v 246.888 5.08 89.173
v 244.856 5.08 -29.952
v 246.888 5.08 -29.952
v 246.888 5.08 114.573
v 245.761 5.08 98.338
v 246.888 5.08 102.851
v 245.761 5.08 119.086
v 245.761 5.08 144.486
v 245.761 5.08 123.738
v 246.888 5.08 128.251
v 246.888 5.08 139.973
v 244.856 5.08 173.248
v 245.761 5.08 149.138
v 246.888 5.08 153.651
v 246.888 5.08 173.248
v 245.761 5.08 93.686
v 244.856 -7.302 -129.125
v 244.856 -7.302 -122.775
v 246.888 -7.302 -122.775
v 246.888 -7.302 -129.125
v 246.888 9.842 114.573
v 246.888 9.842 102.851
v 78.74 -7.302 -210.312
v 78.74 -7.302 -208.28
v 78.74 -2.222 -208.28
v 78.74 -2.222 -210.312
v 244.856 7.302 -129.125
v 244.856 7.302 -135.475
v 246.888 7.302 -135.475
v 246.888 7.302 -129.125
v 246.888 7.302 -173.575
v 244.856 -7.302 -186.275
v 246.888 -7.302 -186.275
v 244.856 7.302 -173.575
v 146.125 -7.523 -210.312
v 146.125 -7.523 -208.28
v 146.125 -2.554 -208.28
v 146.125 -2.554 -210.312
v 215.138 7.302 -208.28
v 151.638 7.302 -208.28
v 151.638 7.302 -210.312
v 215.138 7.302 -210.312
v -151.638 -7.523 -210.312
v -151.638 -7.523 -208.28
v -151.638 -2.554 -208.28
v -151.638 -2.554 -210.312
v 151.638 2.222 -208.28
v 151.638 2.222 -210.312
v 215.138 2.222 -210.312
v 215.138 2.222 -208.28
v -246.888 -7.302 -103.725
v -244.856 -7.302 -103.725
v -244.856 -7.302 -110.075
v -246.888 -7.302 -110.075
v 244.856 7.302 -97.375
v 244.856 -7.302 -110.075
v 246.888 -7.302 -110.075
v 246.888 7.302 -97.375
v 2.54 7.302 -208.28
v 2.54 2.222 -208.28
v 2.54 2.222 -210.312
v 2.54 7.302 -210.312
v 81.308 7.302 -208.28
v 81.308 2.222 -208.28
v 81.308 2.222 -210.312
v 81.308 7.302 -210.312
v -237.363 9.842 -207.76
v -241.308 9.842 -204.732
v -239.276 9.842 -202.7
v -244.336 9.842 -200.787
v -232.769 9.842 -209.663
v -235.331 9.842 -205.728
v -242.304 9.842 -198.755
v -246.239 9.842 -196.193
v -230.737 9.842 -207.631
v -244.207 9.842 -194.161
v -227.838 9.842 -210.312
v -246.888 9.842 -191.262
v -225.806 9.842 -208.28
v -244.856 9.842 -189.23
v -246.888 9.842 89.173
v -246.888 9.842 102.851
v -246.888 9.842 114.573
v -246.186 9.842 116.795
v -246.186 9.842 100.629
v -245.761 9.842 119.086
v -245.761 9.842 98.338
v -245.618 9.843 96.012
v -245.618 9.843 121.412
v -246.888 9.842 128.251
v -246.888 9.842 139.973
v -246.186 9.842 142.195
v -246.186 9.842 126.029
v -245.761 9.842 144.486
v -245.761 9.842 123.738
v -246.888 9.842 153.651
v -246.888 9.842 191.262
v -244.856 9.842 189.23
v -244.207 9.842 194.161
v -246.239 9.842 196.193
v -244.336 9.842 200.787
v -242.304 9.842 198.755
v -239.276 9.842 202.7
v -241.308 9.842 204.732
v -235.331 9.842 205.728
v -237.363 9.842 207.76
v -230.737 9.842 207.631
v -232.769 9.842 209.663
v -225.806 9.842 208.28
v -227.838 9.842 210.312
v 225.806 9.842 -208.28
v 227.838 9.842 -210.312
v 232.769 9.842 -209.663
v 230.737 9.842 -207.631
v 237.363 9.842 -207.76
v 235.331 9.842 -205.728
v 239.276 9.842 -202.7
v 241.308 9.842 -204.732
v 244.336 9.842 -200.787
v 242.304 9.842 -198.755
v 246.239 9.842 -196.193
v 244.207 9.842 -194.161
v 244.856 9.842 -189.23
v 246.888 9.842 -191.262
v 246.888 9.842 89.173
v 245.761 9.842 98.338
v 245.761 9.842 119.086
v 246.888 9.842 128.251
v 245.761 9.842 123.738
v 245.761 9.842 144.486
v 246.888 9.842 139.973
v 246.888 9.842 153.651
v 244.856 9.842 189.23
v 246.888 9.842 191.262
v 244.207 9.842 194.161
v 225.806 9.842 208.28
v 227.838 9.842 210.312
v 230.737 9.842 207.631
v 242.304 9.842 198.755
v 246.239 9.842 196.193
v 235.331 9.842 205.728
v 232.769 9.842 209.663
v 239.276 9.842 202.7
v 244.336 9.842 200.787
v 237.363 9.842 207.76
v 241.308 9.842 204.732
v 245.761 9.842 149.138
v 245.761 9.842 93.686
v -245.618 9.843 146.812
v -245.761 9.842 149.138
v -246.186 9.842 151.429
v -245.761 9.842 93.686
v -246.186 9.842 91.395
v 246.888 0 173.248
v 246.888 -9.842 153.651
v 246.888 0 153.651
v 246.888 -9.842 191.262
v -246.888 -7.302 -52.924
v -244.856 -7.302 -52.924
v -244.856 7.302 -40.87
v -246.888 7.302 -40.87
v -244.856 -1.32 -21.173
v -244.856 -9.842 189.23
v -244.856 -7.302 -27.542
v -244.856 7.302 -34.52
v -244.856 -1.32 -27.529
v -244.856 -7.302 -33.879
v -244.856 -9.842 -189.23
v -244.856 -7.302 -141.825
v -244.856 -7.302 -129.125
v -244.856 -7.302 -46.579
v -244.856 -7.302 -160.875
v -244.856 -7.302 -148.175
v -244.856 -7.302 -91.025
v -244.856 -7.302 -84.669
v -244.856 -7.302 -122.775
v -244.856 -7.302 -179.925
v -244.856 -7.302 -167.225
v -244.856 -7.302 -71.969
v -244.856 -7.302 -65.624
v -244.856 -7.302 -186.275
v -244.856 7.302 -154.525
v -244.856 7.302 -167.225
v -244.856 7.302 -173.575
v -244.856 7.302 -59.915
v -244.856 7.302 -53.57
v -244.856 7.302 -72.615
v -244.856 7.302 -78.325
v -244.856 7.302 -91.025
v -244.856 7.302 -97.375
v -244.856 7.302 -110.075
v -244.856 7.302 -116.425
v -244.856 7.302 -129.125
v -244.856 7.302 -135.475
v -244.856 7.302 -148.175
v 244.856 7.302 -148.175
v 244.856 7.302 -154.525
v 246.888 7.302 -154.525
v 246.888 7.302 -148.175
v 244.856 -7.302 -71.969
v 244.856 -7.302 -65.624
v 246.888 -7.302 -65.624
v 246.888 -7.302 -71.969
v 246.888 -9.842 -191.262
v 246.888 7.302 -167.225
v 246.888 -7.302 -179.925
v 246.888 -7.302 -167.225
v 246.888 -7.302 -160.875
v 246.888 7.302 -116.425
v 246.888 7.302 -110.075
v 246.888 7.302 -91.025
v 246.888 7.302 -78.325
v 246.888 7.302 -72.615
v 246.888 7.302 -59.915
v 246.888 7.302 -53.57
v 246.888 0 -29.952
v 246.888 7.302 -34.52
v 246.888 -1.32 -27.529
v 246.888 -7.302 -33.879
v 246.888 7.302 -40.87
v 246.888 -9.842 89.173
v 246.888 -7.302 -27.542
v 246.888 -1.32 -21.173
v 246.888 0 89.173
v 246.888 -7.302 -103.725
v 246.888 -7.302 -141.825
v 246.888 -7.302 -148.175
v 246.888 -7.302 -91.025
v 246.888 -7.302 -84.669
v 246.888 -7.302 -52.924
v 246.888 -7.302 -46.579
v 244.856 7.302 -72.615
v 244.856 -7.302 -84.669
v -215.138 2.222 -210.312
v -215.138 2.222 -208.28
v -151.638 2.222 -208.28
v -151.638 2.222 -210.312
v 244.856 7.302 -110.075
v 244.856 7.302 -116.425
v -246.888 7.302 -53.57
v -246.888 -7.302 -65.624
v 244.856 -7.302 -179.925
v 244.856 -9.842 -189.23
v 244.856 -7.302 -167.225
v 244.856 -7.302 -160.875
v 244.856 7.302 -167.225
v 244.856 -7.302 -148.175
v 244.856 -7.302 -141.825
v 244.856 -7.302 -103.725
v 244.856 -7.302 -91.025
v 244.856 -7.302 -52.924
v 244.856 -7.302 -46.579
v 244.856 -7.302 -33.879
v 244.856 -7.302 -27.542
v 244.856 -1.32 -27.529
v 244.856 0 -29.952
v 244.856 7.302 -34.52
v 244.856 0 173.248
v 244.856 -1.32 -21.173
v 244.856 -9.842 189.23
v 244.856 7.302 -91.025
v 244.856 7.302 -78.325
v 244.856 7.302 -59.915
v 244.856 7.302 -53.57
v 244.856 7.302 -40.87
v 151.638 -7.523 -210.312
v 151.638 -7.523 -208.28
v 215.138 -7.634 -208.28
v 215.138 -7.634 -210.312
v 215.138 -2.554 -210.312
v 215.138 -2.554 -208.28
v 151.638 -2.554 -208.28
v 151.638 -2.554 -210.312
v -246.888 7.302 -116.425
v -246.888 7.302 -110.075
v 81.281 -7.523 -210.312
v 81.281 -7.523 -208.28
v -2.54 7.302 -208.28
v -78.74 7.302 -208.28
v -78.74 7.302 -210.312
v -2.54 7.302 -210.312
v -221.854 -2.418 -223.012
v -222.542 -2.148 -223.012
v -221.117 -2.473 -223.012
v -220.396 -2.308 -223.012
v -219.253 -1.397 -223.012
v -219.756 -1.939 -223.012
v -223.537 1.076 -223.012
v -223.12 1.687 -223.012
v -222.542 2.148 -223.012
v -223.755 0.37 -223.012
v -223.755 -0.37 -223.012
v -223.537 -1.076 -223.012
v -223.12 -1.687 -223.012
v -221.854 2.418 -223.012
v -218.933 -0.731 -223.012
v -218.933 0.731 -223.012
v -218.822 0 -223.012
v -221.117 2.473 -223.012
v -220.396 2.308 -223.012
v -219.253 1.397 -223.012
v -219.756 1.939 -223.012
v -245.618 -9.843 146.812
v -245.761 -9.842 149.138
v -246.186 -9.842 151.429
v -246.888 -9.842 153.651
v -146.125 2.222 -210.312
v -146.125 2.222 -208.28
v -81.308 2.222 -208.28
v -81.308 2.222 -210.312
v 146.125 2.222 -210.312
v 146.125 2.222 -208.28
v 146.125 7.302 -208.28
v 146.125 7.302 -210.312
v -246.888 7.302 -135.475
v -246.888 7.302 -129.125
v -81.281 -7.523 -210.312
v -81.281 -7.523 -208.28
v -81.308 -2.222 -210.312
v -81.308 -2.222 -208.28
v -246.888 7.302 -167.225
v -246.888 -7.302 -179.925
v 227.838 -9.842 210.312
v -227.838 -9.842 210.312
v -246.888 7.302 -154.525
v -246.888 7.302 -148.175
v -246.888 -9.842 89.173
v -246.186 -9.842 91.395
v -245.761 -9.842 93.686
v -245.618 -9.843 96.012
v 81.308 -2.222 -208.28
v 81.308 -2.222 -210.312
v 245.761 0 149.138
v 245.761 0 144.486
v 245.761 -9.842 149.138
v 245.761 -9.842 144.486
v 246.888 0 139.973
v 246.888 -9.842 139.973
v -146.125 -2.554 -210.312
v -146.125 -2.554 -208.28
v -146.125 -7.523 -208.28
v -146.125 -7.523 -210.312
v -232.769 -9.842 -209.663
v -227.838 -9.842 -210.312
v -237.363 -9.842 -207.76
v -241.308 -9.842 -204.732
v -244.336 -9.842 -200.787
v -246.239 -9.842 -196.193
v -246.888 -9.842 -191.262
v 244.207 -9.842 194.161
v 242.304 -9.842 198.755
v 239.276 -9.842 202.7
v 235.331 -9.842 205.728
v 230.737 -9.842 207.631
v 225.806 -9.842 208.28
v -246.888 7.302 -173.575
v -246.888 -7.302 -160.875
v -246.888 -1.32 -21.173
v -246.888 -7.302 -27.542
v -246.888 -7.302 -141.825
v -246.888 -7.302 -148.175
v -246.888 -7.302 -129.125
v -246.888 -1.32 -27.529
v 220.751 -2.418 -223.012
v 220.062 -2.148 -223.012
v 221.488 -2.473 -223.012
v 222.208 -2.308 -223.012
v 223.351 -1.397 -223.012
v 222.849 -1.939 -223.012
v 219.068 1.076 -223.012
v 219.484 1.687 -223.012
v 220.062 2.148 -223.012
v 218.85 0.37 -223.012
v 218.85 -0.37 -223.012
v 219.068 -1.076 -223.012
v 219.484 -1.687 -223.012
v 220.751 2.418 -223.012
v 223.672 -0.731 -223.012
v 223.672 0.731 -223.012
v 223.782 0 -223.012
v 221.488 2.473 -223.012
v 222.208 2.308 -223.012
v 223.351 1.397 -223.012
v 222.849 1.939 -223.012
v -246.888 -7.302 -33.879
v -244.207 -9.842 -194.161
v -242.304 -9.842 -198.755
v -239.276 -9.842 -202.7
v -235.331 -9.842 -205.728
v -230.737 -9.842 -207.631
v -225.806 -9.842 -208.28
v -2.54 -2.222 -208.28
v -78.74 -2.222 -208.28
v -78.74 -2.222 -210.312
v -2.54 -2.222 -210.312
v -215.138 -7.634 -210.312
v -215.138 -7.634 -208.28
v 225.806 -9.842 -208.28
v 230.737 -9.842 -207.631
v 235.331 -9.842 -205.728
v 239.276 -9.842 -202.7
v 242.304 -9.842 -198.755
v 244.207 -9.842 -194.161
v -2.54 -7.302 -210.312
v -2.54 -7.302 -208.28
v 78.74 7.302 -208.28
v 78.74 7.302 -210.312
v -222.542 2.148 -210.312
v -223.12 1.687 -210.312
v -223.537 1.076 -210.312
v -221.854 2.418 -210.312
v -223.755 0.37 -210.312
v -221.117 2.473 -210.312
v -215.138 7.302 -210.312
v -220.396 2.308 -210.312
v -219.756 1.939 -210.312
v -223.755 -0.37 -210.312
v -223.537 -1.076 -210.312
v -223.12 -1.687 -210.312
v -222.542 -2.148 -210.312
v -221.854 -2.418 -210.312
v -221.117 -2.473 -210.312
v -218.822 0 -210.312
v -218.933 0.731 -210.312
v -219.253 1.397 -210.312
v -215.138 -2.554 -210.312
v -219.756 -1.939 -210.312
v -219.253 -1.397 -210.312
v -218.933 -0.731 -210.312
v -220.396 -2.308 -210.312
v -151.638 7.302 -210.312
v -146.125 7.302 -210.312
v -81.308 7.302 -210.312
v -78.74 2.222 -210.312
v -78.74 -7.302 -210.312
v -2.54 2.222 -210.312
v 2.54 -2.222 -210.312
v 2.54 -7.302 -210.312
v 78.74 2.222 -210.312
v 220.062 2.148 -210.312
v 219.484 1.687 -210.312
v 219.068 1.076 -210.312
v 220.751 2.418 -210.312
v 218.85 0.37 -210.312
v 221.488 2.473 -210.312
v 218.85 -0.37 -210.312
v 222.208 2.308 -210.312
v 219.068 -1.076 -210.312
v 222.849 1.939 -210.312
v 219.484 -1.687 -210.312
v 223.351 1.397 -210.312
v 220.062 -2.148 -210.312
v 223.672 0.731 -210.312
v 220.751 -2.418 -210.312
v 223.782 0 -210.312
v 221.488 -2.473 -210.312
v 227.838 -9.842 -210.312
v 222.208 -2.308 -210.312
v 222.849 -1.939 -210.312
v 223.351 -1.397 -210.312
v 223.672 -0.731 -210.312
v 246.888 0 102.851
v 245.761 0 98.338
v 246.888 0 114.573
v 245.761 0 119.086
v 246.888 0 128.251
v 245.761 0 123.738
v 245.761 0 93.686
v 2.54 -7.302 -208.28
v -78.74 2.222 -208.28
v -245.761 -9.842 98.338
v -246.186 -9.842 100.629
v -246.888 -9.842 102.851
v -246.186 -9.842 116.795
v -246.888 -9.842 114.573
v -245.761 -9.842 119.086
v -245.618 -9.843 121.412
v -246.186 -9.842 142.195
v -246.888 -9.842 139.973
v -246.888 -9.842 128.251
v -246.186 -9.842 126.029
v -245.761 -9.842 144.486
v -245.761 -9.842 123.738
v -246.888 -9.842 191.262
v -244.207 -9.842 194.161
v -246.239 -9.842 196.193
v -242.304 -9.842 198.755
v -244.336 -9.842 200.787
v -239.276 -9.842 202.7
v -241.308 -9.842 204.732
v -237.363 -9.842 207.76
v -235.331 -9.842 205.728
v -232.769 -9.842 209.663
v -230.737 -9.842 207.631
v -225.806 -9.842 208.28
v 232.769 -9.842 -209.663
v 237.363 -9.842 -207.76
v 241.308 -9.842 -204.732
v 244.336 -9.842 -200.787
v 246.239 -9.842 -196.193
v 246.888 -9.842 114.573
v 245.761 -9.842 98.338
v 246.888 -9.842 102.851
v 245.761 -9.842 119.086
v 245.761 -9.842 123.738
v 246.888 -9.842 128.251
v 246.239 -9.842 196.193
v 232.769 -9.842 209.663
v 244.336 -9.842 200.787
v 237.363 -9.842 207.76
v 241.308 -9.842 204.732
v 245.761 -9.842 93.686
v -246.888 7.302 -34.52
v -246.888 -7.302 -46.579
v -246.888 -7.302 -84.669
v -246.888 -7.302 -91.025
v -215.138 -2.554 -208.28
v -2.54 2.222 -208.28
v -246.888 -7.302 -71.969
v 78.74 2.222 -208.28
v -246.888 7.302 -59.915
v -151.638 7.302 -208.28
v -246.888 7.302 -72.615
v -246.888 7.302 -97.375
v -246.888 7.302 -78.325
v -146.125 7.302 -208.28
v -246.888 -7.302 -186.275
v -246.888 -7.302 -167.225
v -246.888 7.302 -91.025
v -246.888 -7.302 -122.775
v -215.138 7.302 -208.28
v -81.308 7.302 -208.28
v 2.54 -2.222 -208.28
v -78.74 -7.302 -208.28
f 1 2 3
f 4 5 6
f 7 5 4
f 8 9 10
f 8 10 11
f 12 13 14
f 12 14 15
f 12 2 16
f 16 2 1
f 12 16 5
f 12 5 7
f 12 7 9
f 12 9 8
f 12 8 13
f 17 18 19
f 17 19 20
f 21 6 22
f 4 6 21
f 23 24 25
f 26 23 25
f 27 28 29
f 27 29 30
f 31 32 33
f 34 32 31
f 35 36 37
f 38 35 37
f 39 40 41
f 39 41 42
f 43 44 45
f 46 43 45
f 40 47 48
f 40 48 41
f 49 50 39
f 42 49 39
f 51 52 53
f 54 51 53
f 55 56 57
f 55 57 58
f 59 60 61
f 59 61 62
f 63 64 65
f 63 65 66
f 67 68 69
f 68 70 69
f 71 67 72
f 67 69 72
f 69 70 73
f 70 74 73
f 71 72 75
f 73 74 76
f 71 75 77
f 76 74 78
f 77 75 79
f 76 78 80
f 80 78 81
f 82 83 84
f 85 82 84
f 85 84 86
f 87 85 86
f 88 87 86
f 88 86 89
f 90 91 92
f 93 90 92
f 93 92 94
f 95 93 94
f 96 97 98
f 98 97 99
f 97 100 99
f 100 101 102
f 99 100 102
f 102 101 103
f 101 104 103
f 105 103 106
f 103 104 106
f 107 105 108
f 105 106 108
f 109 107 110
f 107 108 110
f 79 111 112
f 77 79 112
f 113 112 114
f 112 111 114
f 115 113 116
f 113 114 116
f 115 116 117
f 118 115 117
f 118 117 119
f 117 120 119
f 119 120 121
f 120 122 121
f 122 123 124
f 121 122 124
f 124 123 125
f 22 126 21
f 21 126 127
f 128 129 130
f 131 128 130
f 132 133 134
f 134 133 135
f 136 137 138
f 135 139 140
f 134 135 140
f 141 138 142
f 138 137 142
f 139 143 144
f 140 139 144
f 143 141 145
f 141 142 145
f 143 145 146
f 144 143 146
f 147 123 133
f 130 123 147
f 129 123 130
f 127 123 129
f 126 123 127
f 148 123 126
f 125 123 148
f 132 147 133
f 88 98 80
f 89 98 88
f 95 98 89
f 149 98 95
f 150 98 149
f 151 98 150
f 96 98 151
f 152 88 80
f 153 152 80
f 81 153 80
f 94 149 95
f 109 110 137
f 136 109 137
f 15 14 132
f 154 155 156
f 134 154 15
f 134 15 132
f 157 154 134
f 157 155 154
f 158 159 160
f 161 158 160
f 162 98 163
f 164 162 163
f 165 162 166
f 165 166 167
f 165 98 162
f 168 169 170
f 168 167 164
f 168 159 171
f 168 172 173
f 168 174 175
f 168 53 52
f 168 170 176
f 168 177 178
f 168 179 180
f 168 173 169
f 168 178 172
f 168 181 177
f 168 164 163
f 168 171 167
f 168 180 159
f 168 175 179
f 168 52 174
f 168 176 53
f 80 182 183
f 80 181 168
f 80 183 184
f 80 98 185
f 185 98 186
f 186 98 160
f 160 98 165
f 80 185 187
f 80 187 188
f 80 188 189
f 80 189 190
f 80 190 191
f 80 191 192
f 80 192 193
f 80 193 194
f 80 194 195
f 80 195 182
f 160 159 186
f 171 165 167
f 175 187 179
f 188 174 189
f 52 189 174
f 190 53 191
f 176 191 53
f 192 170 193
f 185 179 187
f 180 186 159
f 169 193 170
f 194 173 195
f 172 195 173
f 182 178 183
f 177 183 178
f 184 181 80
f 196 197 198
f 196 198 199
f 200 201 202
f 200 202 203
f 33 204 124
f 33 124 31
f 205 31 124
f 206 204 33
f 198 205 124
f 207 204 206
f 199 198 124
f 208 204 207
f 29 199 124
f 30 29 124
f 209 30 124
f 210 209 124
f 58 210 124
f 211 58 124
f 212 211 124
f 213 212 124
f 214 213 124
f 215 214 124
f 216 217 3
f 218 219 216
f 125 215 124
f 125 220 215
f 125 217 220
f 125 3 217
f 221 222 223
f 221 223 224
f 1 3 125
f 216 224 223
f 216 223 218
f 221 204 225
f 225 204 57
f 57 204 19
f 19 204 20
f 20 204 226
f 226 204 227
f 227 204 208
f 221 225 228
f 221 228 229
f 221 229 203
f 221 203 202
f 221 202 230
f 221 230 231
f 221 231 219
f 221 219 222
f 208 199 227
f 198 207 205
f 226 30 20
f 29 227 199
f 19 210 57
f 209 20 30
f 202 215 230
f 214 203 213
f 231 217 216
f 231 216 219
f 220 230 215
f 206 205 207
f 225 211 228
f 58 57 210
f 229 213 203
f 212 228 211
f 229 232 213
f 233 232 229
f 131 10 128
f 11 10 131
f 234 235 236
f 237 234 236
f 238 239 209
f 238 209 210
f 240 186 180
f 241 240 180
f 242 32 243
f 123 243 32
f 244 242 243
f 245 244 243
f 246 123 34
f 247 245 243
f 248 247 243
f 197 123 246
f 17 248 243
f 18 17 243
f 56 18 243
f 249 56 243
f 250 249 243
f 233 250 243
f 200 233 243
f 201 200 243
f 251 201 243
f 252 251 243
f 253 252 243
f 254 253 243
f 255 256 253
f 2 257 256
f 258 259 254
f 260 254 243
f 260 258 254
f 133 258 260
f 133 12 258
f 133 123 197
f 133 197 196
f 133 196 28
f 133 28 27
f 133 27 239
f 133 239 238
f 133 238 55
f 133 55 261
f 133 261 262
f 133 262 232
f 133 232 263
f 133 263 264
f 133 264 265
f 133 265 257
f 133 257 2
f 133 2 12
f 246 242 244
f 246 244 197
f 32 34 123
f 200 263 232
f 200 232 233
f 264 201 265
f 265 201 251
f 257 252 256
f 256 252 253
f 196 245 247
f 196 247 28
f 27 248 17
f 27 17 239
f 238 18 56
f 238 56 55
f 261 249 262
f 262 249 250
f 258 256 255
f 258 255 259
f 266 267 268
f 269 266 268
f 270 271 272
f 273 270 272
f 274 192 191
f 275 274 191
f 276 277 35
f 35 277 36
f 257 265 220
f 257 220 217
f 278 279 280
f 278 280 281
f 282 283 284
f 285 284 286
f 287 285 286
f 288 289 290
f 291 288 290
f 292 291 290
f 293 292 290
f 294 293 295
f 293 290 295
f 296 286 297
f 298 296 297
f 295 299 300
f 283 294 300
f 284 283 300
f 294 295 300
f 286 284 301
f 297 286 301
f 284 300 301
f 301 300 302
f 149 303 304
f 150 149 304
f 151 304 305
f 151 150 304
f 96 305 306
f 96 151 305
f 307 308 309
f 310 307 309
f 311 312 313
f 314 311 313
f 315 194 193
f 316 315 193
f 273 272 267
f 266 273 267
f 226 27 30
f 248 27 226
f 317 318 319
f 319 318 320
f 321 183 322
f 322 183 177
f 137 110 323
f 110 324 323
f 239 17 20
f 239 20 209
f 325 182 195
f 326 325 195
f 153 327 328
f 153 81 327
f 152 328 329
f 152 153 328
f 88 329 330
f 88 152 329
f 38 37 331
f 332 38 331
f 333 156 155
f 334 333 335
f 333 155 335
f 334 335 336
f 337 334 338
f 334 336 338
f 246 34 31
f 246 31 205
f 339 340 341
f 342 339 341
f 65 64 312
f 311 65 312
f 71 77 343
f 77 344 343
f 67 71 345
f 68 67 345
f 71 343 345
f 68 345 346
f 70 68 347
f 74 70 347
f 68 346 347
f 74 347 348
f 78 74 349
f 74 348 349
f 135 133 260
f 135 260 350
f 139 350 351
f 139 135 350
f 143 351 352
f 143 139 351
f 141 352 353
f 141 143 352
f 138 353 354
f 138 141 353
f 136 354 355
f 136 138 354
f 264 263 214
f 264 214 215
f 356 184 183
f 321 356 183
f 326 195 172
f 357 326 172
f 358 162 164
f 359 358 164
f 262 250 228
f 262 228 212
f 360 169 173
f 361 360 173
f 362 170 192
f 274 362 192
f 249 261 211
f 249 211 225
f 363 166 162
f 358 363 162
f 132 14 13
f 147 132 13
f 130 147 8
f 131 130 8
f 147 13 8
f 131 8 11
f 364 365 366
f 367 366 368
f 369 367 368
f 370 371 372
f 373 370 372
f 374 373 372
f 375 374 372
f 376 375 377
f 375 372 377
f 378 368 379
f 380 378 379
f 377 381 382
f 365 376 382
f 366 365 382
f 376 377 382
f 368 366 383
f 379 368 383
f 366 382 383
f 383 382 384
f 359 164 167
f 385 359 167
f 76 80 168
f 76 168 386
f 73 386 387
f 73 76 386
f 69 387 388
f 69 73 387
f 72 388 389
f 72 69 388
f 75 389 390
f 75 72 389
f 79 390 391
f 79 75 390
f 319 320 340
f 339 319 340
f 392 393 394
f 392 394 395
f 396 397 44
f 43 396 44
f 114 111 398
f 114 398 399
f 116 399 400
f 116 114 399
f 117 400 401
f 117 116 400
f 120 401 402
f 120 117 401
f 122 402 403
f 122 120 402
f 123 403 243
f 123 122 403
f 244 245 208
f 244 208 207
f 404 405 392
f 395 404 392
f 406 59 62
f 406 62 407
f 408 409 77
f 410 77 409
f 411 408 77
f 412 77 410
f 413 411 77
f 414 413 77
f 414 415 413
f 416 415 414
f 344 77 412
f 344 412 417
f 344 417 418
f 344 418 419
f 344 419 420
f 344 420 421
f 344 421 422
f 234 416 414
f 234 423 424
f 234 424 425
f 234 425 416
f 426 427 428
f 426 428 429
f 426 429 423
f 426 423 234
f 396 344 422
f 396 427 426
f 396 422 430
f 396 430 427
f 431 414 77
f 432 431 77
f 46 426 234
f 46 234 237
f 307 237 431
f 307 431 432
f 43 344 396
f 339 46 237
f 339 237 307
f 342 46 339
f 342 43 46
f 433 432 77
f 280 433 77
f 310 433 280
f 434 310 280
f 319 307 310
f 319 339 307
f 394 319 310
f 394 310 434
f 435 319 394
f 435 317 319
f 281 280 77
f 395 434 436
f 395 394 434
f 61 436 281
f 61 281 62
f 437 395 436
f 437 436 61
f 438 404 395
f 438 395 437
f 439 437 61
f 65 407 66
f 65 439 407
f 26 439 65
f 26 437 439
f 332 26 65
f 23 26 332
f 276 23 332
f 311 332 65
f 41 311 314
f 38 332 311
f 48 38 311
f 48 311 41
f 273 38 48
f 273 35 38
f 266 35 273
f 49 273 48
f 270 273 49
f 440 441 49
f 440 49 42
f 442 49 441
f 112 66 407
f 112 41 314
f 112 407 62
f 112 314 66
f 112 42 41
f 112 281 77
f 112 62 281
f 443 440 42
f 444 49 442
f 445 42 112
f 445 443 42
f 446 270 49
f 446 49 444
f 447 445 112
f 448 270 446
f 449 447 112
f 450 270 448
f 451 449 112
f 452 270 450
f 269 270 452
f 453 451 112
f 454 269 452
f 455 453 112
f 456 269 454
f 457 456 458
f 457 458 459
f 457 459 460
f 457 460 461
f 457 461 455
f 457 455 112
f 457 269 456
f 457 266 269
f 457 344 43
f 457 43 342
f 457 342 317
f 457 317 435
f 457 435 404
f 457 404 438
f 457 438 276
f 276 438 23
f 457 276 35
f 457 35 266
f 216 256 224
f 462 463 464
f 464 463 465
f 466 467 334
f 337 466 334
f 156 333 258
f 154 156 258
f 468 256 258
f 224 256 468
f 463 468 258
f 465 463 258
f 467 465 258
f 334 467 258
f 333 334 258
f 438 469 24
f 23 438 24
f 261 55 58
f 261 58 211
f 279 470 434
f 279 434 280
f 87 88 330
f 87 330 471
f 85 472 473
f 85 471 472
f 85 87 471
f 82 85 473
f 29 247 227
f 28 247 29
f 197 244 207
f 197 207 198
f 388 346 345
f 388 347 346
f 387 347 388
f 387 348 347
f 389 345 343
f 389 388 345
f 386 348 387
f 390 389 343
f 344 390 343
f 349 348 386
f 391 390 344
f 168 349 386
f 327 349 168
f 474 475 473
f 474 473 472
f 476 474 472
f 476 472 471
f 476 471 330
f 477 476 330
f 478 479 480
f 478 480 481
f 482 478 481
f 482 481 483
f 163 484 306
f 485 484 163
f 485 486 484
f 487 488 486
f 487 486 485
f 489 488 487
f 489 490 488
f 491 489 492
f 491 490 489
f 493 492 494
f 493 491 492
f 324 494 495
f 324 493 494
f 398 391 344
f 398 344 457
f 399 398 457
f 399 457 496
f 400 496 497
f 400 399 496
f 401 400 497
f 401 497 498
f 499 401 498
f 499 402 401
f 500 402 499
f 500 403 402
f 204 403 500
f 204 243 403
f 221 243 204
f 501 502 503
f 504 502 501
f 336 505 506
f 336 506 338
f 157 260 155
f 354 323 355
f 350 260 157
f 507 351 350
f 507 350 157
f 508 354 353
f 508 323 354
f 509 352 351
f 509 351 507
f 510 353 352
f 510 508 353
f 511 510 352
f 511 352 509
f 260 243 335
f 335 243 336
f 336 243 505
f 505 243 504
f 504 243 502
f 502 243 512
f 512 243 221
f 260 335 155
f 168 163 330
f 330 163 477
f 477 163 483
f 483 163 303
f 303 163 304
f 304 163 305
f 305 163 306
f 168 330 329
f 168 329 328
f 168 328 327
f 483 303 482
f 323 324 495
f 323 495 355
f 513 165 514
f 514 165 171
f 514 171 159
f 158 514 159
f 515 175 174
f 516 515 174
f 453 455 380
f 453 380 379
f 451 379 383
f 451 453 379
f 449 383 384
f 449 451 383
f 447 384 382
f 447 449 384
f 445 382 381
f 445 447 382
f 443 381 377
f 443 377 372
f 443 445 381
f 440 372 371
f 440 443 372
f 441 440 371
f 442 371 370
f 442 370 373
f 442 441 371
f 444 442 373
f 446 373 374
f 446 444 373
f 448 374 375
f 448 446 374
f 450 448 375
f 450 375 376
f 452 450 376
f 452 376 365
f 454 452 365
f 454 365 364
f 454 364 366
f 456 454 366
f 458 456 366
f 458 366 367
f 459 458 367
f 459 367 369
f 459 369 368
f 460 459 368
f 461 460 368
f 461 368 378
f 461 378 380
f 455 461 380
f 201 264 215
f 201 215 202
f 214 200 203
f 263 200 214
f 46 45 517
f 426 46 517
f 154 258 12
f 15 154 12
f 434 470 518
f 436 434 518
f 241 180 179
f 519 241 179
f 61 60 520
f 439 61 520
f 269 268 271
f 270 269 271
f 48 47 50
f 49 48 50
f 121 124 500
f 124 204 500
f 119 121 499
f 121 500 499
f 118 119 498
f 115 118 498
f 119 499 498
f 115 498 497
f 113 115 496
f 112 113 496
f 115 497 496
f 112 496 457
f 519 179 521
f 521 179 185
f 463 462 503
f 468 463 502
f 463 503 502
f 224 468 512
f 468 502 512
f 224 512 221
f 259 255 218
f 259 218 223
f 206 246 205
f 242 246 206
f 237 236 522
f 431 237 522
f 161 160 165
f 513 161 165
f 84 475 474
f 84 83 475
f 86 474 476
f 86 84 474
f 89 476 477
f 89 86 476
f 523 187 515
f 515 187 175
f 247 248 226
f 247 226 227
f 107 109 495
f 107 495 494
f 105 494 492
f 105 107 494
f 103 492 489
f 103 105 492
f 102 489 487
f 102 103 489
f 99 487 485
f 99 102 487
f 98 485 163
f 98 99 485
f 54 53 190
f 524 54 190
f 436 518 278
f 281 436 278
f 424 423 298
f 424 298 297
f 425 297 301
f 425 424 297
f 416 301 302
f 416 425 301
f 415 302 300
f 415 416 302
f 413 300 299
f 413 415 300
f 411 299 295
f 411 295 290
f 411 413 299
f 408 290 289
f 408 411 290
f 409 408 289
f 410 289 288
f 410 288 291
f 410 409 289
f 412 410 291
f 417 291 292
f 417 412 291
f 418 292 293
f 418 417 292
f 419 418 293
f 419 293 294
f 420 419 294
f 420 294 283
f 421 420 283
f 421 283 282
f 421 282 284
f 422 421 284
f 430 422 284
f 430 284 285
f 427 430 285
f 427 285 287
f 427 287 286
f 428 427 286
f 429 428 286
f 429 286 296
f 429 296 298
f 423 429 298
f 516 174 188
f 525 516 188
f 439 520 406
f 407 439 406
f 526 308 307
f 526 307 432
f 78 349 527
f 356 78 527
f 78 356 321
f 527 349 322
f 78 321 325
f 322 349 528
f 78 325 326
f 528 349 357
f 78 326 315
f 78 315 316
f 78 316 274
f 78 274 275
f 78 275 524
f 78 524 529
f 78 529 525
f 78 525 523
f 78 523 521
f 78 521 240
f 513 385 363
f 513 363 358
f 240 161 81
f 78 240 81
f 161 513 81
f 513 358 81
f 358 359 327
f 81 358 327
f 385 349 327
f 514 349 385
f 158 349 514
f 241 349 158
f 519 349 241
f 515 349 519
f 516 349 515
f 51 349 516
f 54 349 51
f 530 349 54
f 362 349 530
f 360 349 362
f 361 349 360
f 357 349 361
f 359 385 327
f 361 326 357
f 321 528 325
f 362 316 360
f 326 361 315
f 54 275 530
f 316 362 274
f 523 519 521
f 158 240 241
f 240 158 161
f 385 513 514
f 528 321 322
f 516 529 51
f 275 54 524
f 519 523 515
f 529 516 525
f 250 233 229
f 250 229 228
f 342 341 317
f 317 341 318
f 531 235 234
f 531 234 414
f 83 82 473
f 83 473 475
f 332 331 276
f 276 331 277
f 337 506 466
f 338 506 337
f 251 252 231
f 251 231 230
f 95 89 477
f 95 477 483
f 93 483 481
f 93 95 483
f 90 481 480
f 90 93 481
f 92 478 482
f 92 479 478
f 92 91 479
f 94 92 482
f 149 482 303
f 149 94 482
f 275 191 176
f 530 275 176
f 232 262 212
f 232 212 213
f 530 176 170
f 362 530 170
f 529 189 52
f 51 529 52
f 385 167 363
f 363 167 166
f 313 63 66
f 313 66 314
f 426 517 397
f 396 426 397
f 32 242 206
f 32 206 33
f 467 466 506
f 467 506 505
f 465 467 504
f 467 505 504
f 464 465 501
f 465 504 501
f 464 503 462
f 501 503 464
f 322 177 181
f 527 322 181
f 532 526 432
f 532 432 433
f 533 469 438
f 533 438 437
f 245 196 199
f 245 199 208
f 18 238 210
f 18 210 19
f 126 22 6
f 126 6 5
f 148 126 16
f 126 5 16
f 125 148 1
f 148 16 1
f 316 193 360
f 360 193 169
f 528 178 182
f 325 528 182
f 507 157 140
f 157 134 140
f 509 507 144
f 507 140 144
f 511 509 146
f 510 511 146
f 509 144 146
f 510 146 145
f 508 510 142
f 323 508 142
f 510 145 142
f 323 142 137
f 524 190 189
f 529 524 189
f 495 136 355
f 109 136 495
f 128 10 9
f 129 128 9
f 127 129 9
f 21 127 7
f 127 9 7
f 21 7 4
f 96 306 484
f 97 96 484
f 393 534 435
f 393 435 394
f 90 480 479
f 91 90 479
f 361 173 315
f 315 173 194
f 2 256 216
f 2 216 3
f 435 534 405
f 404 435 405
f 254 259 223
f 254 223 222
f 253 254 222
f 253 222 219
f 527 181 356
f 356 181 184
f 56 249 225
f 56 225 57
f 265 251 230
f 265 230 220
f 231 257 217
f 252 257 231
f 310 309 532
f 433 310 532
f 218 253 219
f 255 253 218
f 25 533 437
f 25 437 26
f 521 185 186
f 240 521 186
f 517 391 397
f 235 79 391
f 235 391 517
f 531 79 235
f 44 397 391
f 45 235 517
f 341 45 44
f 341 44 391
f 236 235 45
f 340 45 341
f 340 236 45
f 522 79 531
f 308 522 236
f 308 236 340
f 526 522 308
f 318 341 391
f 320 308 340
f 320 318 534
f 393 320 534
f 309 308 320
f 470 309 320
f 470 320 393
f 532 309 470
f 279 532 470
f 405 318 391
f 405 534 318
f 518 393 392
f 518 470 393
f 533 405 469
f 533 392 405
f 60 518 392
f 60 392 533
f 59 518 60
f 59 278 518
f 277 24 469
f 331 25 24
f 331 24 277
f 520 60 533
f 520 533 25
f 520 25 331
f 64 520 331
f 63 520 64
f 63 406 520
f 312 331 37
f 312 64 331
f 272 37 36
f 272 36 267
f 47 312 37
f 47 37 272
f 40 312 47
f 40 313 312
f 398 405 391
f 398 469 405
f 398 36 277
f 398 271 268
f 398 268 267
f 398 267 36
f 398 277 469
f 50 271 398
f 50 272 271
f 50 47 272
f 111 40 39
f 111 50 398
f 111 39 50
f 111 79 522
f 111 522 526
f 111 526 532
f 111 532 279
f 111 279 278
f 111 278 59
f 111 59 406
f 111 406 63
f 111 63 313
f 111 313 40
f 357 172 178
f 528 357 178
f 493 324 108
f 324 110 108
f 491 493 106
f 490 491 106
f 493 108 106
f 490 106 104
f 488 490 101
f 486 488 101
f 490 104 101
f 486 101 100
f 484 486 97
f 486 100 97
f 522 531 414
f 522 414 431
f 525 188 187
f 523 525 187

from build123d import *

# Parameters (mm, degrees)
F0_W      = 493.776
F0_H      = 420.624
F1_DEPTH  = 9.8425
F2_R      = 19.05
F3_R      = 19.05
F4_R      = 19.05
F5_R      = 19.05
F7_DEPTH  = 9.8435
F8_DEPTH  = 50.8
F9_DEPTH  = 9.8435
F11_DEPTH = 381
F12_DEPTH = 381
F13_W     = 76.2
F13_H     = 5.08
F13_W_2   = 63.499903
F13_W_3   = 64.816944
F14_DEPTH = 254
F16_DEPTH = 63.5
F17_R     = 2.479907
F18_DEPTH = 223.012
F19_DEPTH = 208.28
F20_W     = 5.08
F20_H     = 203.2
F21_DEPTH = 254


with BuildPart() as f1:
    # F0 (on Front) → F1 (new body, symmetric)
    with BuildSketch(Plane.XZ):
        Rectangle(F0_W, F0_H)
    extrude(amount=F1_DEPTH, both=True)

    # F2
    f2_edges = [f1.edges().sort_by_distance(p)[0] for p in [
        (246.888, 0, 210.312),
    ]]
    fillet(f2_edges, radius=F2_R)

    # F3
    f3_edges = [f1.edges().sort_by_distance(p)[0] for p in [
        (-246.888, 0, 210.312),
    ]]
    fillet(f3_edges, radius=F3_R)

    # F4
    f4_edges = [f1.edges().sort_by_distance(p)[0] for p in [
        (246.888, 0, -210.312),
    ]]
    fillet(f4_edges, radius=F4_R)

    # F5
    f5_edges = [f1.edges().sort_by_distance(p)[0] for p in [
        (-246.888, 0, -210.312),
    ]]
    fillet(f5_edges, radius=F5_R)

    # F6 (on Front) → F7 (cut, through all)
    with BuildSketch(Plane.XZ):
        with BuildLine():
            ThreePointArc((244.856, 189.23), (239.276384, 202.700384), (225.806, 208.28))
            Line((225.806, 208.28), (-225.806, 208.28))
            ThreePointArc((-225.806, 208.28), (-239.276384, 202.700384), (-244.856, 189.23))
            Line((-244.856, 189.23), (-244.856, -189.23))
            ThreePointArc((-244.856, -189.23), (-239.276384, -202.700384), (-225.806, -208.28))
            Line((-225.806, -208.28), (225.806, -208.28))
            ThreePointArc((225.806, -208.28), (239.276384, -202.700384), (244.856, -189.23))
            Line((244.856, -189.23), (244.856, 189.23))
        make_face()
    extrude(amount=-F7_DEPTH, mode=Mode.SUBTRACT)

    # F6 (on Front) → F8 (cut)
    with BuildSketch(Plane.XZ):
        with BuildLine():
            ThreePointArc((244.856, 189.23), (239.276384, 202.700384), (225.806, 208.28))
            Line((225.806, 208.28), (-225.806, 208.28))
            ThreePointArc((-225.806, 208.28), (-239.276384, 202.700384), (-244.856, 189.23))
            Line((-244.856, 189.23), (-244.856, -189.23))
            ThreePointArc((-244.856, -189.23), (-239.276384, -202.700384), (-225.806, -208.28))
            Line((-225.806, -208.28), (225.806, -208.28))
            ThreePointArc((225.806, -208.28), (239.276384, -202.700384), (244.856, -189.23))
            Line((244.856, -189.23), (244.856, 189.23))
        make_face()
    extrude(amount=-F8_DEPTH, mode=Mode.SUBTRACT)

    # F6 (on Front) → F9 (cut, through all)
    with BuildSketch(Plane.XZ):
        with BuildLine():
            ThreePointArc((244.856, 189.23), (239.276384, 202.700384), (225.806, 208.28))
            Line((225.806, 208.28), (-225.806, 208.28))
            ThreePointArc((-225.806, 208.28), (-239.276384, 202.700384), (-244.856, 189.23))
            Line((-244.856, 189.23), (-244.856, -189.23))
            ThreePointArc((-244.856, -189.23), (-239.276384, -202.700384), (-225.806, -208.28))
            Line((-225.806, -208.28), (225.806, -208.28))
            ThreePointArc((225.806, -208.28), (239.276384, -202.700384), (244.856, -189.23))
            Line((244.856, -189.23), (244.856, 189.23))
        make_face()
    extrude(amount=F9_DEPTH, mode=Mode.SUBTRACT)

    # F10 (on Right) → F11 (cut)
    with BuildSketch(Plane.YZ):
        Polygon((7.3025, -40.869898), (7.3025, -34.519898), (-7.3025, -46.578553), (-7.3025, -52.924015), align=None)
        Polygon((7.3025, -59.915363), (7.3025, -53.569898), (-7.3025, -65.624015), (-7.3025, -71.969477), align=None)
        Polygon((-7.3025, -27.542157), (-7.3025, -33.878553), (-1.32043, -27.528553), (-1.32043, -21.173388), align=None)
        Polygon((7.3025, -72.615363), (-7.3025, -84.669477), (-7.3025, -91.024636), (7.3025, -78.324636), align=None)
        Polygon((7.3025, -91.024636), (-7.3025, -103.724636), (-7.3025, -110.074636), (7.3025, -97.374636), align=None)
        Polygon((7.3025, -110.074636), (-7.3025, -122.774636), (-7.3025, -129.124636), (7.3025, -116.424636), align=None)
        Polygon((7.3025, -129.124636), (-7.3025, -141.824636), (-7.3025, -148.174636), (7.3025, -135.474636), align=None)
        Polygon((7.3025, -148.174636), (-7.3025, -160.874636), (-7.3025, -167.224636), (7.3025, -154.524636), align=None)
        Polygon((7.3025, -167.224636), (-7.3025, -179.924636), (-7.3025, -186.274636), (7.3025, -173.574636), align=None)
    extrude(amount=-F11_DEPTH, mode=Mode.SUBTRACT)

    # F10 (on Right) → F12 (cut)
    with BuildSketch(Plane.YZ):
        Polygon((7.3025, -40.869898), (7.3025, -34.519898), (-7.3025, -46.578553), (-7.3025, -52.924015), align=None)
        Polygon((7.3025, -59.915363), (7.3025, -53.569898), (-7.3025, -65.624015), (-7.3025, -71.969477), align=None)
        Polygon((-7.3025, -27.542157), (-7.3025, -33.878553), (-1.32043, -27.528553), (-1.32043, -21.173388), align=None)
        Polygon((7.3025, -72.615363), (-7.3025, -84.669477), (-7.3025, -91.024636), (7.3025, -78.324636), align=None)
        Polygon((7.3025, -91.024636), (-7.3025, -103.724636), (-7.3025, -110.074636), (7.3025, -97.374636), align=None)
        Polygon((7.3025, -110.074636), (-7.3025, -122.774636), (-7.3025, -129.124636), (7.3025, -116.424636), align=None)
        Polygon((7.3025, -129.124636), (-7.3025, -141.824636), (-7.3025, -148.174636), (7.3025, -135.474636), align=None)
        Polygon((7.3025, -148.174636), (-7.3025, -160.874636), (-7.3025, -167.224636), (7.3025, -154.524636), align=None)
        Polygon((7.3025, -167.224636), (-7.3025, -179.924636), (-7.3025, -186.274636), (7.3025, -173.574636), align=None)
    extrude(amount=F12_DEPTH, mode=Mode.SUBTRACT)

    # F13 (on Top) → F14 (cut)
    with BuildSketch(Plane.XY):
        with Locations((-40.64, -4.7625)):
            Rectangle(F13_W, F13_H)
        with Locations((-40.64, 4.7625)):
            Rectangle(F13_W, F13_H)
        Polygon((-215.138, -2.553835), (-215.138, -7.633835), (-151.638097, -7.523006), (-151.638097, -2.553835), align=None)
        with Locations((-183.388048, 4.7625)):
            Rectangle(F13_W_2, F13_H)
        Polygon((-146.125123, -2.553835), (-146.125123, -7.523006), (-81.281083, -7.523006), (-81.308179, -2.2225), align=None)
        with Locations((-113.716651, 4.7625)):
            Rectangle(F13_W_3, F13_H)
        with Locations((40.64, -4.7625)):
            Rectangle(F13_W, F13_H)
        with Locations((40.64, 4.7625)):
            Rectangle(F13_W, F13_H)
        Polygon((81.308179, -2.2225), (81.281083, -7.523006), (146.125123, -7.523006), (146.125123, -2.553835), align=None)
        with Locations((113.716651, 4.7625)):
            Rectangle(F13_W_3, F13_H)
        Polygon((151.638097, -2.553835), (151.638097, -7.523006), (215.138, -7.633835), (215.138, -2.553835), align=None)
        with Locations((183.388048, 4.7625)):
            Rectangle(F13_W_2, F13_H)
    extrude(amount=-F14_DEPTH, mode=Mode.SUBTRACT)

    # F15 (on Front) → F16 (cut, symmetric)
    with BuildSketch(Plane.XZ):
        with BuildLine():
            ThreePointArc((-250.468968, 134.112), (-246.872017, 140.014539), (-245.618, 146.812))
            ThreePointArc((-245.618, 146.812), (-271.465461, 164.607983), (-278.867032, 134.112))
            ThreePointArc((-278.867032, 134.112), (-264.668, 140.462), (-250.468968, 134.112))
        make_face()
        with BuildLine():
            ThreePointArc((-250.468968, 134.112), (-264.668, 127.762), (-278.867032, 134.112))
            ThreePointArc((-278.867032, 134.112), (-283.718, 121.412), (-278.867032, 108.712))
            ThreePointArc((-278.867032, 108.712), (-264.668, 115.062), (-250.468968, 108.712))
            ThreePointArc((-250.468968, 108.712), (-246.872017, 114.614539), (-245.618, 121.412))
            ThreePointArc((-245.618, 121.412), (-246.872017, 128.209461), (-250.468968, 134.112))
        make_face()
        with BuildLine():
            ThreePointArc((-250.468968, 108.712), (-264.668, 102.362), (-278.867032, 108.712))
            ThreePointArc((-278.867032, 108.712), (-271.465461, 78.216017), (-245.618, 96.012))
            ThreePointArc((-245.618, 96.012), (-246.872017, 102.809461), (-250.468968, 108.712))
        make_face()
        with BuildLine():
            ThreePointArc((250.468968, 108.712), (257.870539, 78.216017), (283.718, 96.012))
            ThreePointArc((283.718, 96.012), (282.463983, 102.809461), (278.867032, 108.712))
            ThreePointArc((278.867032, 108.712), (264.668, 102.362), (250.468968, 108.712))
        make_face()
        with BuildLine():
            ThreePointArc((250.468968, 108.712), (264.668, 115.062), (278.867032, 108.712))
            ThreePointArc((278.867032, 108.712), (282.463983, 114.614539), (283.718, 121.412))
            ThreePointArc((283.718, 121.412), (282.463983, 128.209461), (278.867032, 134.112))
            ThreePointArc((278.867032, 134.112), (264.668, 127.762), (250.468968, 134.112))
            ThreePointArc((250.468968, 134.112), (245.618, 121.412), (250.468968, 108.712))
        make_face()
        with BuildLine():
            ThreePointArc((283.718, 146.812), (257.870539, 164.607983), (250.468968, 134.112))
            ThreePointArc((250.468968, 134.112), (264.668, 140.462), (278.867032, 134.112))
            ThreePointArc((278.867032, 134.112), (282.463983, 140.014539), (283.718, 146.812))
        make_face()
    extrude(amount=F16_DEPTH, both=True, mode=Mode.SUBTRACT)

    # F17 (on Top) → F18 (join)
    with BuildSketch(Plane.XY):
        with Locations((-221.302345, 0)):
            Circle(F17_R)
        with Locations((221.302345, 0)):
            Circle(F17_R)
    extrude(amount=-F18_DEPTH)

    # F17 (on Top) → F19 (cut)
    with BuildSketch(Plane.XY):
        with Locations((-221.302345, 0)):
            Circle(F17_R)
        with Locations((221.302345, 0)):
            Circle(F17_R)
    extrude(amount=-F19_DEPTH, mode=Mode.SUBTRACT)

    # F20 (on Right) → F21 (cut)
    with BuildSketch(Plane.YZ):
        with Locations((2.54, 71.648132)):
            Rectangle(F20_W, F20_H)
    extrude(amount=F21_DEPTH, mode=Mode.SUBTRACT)


solid = f1.part
